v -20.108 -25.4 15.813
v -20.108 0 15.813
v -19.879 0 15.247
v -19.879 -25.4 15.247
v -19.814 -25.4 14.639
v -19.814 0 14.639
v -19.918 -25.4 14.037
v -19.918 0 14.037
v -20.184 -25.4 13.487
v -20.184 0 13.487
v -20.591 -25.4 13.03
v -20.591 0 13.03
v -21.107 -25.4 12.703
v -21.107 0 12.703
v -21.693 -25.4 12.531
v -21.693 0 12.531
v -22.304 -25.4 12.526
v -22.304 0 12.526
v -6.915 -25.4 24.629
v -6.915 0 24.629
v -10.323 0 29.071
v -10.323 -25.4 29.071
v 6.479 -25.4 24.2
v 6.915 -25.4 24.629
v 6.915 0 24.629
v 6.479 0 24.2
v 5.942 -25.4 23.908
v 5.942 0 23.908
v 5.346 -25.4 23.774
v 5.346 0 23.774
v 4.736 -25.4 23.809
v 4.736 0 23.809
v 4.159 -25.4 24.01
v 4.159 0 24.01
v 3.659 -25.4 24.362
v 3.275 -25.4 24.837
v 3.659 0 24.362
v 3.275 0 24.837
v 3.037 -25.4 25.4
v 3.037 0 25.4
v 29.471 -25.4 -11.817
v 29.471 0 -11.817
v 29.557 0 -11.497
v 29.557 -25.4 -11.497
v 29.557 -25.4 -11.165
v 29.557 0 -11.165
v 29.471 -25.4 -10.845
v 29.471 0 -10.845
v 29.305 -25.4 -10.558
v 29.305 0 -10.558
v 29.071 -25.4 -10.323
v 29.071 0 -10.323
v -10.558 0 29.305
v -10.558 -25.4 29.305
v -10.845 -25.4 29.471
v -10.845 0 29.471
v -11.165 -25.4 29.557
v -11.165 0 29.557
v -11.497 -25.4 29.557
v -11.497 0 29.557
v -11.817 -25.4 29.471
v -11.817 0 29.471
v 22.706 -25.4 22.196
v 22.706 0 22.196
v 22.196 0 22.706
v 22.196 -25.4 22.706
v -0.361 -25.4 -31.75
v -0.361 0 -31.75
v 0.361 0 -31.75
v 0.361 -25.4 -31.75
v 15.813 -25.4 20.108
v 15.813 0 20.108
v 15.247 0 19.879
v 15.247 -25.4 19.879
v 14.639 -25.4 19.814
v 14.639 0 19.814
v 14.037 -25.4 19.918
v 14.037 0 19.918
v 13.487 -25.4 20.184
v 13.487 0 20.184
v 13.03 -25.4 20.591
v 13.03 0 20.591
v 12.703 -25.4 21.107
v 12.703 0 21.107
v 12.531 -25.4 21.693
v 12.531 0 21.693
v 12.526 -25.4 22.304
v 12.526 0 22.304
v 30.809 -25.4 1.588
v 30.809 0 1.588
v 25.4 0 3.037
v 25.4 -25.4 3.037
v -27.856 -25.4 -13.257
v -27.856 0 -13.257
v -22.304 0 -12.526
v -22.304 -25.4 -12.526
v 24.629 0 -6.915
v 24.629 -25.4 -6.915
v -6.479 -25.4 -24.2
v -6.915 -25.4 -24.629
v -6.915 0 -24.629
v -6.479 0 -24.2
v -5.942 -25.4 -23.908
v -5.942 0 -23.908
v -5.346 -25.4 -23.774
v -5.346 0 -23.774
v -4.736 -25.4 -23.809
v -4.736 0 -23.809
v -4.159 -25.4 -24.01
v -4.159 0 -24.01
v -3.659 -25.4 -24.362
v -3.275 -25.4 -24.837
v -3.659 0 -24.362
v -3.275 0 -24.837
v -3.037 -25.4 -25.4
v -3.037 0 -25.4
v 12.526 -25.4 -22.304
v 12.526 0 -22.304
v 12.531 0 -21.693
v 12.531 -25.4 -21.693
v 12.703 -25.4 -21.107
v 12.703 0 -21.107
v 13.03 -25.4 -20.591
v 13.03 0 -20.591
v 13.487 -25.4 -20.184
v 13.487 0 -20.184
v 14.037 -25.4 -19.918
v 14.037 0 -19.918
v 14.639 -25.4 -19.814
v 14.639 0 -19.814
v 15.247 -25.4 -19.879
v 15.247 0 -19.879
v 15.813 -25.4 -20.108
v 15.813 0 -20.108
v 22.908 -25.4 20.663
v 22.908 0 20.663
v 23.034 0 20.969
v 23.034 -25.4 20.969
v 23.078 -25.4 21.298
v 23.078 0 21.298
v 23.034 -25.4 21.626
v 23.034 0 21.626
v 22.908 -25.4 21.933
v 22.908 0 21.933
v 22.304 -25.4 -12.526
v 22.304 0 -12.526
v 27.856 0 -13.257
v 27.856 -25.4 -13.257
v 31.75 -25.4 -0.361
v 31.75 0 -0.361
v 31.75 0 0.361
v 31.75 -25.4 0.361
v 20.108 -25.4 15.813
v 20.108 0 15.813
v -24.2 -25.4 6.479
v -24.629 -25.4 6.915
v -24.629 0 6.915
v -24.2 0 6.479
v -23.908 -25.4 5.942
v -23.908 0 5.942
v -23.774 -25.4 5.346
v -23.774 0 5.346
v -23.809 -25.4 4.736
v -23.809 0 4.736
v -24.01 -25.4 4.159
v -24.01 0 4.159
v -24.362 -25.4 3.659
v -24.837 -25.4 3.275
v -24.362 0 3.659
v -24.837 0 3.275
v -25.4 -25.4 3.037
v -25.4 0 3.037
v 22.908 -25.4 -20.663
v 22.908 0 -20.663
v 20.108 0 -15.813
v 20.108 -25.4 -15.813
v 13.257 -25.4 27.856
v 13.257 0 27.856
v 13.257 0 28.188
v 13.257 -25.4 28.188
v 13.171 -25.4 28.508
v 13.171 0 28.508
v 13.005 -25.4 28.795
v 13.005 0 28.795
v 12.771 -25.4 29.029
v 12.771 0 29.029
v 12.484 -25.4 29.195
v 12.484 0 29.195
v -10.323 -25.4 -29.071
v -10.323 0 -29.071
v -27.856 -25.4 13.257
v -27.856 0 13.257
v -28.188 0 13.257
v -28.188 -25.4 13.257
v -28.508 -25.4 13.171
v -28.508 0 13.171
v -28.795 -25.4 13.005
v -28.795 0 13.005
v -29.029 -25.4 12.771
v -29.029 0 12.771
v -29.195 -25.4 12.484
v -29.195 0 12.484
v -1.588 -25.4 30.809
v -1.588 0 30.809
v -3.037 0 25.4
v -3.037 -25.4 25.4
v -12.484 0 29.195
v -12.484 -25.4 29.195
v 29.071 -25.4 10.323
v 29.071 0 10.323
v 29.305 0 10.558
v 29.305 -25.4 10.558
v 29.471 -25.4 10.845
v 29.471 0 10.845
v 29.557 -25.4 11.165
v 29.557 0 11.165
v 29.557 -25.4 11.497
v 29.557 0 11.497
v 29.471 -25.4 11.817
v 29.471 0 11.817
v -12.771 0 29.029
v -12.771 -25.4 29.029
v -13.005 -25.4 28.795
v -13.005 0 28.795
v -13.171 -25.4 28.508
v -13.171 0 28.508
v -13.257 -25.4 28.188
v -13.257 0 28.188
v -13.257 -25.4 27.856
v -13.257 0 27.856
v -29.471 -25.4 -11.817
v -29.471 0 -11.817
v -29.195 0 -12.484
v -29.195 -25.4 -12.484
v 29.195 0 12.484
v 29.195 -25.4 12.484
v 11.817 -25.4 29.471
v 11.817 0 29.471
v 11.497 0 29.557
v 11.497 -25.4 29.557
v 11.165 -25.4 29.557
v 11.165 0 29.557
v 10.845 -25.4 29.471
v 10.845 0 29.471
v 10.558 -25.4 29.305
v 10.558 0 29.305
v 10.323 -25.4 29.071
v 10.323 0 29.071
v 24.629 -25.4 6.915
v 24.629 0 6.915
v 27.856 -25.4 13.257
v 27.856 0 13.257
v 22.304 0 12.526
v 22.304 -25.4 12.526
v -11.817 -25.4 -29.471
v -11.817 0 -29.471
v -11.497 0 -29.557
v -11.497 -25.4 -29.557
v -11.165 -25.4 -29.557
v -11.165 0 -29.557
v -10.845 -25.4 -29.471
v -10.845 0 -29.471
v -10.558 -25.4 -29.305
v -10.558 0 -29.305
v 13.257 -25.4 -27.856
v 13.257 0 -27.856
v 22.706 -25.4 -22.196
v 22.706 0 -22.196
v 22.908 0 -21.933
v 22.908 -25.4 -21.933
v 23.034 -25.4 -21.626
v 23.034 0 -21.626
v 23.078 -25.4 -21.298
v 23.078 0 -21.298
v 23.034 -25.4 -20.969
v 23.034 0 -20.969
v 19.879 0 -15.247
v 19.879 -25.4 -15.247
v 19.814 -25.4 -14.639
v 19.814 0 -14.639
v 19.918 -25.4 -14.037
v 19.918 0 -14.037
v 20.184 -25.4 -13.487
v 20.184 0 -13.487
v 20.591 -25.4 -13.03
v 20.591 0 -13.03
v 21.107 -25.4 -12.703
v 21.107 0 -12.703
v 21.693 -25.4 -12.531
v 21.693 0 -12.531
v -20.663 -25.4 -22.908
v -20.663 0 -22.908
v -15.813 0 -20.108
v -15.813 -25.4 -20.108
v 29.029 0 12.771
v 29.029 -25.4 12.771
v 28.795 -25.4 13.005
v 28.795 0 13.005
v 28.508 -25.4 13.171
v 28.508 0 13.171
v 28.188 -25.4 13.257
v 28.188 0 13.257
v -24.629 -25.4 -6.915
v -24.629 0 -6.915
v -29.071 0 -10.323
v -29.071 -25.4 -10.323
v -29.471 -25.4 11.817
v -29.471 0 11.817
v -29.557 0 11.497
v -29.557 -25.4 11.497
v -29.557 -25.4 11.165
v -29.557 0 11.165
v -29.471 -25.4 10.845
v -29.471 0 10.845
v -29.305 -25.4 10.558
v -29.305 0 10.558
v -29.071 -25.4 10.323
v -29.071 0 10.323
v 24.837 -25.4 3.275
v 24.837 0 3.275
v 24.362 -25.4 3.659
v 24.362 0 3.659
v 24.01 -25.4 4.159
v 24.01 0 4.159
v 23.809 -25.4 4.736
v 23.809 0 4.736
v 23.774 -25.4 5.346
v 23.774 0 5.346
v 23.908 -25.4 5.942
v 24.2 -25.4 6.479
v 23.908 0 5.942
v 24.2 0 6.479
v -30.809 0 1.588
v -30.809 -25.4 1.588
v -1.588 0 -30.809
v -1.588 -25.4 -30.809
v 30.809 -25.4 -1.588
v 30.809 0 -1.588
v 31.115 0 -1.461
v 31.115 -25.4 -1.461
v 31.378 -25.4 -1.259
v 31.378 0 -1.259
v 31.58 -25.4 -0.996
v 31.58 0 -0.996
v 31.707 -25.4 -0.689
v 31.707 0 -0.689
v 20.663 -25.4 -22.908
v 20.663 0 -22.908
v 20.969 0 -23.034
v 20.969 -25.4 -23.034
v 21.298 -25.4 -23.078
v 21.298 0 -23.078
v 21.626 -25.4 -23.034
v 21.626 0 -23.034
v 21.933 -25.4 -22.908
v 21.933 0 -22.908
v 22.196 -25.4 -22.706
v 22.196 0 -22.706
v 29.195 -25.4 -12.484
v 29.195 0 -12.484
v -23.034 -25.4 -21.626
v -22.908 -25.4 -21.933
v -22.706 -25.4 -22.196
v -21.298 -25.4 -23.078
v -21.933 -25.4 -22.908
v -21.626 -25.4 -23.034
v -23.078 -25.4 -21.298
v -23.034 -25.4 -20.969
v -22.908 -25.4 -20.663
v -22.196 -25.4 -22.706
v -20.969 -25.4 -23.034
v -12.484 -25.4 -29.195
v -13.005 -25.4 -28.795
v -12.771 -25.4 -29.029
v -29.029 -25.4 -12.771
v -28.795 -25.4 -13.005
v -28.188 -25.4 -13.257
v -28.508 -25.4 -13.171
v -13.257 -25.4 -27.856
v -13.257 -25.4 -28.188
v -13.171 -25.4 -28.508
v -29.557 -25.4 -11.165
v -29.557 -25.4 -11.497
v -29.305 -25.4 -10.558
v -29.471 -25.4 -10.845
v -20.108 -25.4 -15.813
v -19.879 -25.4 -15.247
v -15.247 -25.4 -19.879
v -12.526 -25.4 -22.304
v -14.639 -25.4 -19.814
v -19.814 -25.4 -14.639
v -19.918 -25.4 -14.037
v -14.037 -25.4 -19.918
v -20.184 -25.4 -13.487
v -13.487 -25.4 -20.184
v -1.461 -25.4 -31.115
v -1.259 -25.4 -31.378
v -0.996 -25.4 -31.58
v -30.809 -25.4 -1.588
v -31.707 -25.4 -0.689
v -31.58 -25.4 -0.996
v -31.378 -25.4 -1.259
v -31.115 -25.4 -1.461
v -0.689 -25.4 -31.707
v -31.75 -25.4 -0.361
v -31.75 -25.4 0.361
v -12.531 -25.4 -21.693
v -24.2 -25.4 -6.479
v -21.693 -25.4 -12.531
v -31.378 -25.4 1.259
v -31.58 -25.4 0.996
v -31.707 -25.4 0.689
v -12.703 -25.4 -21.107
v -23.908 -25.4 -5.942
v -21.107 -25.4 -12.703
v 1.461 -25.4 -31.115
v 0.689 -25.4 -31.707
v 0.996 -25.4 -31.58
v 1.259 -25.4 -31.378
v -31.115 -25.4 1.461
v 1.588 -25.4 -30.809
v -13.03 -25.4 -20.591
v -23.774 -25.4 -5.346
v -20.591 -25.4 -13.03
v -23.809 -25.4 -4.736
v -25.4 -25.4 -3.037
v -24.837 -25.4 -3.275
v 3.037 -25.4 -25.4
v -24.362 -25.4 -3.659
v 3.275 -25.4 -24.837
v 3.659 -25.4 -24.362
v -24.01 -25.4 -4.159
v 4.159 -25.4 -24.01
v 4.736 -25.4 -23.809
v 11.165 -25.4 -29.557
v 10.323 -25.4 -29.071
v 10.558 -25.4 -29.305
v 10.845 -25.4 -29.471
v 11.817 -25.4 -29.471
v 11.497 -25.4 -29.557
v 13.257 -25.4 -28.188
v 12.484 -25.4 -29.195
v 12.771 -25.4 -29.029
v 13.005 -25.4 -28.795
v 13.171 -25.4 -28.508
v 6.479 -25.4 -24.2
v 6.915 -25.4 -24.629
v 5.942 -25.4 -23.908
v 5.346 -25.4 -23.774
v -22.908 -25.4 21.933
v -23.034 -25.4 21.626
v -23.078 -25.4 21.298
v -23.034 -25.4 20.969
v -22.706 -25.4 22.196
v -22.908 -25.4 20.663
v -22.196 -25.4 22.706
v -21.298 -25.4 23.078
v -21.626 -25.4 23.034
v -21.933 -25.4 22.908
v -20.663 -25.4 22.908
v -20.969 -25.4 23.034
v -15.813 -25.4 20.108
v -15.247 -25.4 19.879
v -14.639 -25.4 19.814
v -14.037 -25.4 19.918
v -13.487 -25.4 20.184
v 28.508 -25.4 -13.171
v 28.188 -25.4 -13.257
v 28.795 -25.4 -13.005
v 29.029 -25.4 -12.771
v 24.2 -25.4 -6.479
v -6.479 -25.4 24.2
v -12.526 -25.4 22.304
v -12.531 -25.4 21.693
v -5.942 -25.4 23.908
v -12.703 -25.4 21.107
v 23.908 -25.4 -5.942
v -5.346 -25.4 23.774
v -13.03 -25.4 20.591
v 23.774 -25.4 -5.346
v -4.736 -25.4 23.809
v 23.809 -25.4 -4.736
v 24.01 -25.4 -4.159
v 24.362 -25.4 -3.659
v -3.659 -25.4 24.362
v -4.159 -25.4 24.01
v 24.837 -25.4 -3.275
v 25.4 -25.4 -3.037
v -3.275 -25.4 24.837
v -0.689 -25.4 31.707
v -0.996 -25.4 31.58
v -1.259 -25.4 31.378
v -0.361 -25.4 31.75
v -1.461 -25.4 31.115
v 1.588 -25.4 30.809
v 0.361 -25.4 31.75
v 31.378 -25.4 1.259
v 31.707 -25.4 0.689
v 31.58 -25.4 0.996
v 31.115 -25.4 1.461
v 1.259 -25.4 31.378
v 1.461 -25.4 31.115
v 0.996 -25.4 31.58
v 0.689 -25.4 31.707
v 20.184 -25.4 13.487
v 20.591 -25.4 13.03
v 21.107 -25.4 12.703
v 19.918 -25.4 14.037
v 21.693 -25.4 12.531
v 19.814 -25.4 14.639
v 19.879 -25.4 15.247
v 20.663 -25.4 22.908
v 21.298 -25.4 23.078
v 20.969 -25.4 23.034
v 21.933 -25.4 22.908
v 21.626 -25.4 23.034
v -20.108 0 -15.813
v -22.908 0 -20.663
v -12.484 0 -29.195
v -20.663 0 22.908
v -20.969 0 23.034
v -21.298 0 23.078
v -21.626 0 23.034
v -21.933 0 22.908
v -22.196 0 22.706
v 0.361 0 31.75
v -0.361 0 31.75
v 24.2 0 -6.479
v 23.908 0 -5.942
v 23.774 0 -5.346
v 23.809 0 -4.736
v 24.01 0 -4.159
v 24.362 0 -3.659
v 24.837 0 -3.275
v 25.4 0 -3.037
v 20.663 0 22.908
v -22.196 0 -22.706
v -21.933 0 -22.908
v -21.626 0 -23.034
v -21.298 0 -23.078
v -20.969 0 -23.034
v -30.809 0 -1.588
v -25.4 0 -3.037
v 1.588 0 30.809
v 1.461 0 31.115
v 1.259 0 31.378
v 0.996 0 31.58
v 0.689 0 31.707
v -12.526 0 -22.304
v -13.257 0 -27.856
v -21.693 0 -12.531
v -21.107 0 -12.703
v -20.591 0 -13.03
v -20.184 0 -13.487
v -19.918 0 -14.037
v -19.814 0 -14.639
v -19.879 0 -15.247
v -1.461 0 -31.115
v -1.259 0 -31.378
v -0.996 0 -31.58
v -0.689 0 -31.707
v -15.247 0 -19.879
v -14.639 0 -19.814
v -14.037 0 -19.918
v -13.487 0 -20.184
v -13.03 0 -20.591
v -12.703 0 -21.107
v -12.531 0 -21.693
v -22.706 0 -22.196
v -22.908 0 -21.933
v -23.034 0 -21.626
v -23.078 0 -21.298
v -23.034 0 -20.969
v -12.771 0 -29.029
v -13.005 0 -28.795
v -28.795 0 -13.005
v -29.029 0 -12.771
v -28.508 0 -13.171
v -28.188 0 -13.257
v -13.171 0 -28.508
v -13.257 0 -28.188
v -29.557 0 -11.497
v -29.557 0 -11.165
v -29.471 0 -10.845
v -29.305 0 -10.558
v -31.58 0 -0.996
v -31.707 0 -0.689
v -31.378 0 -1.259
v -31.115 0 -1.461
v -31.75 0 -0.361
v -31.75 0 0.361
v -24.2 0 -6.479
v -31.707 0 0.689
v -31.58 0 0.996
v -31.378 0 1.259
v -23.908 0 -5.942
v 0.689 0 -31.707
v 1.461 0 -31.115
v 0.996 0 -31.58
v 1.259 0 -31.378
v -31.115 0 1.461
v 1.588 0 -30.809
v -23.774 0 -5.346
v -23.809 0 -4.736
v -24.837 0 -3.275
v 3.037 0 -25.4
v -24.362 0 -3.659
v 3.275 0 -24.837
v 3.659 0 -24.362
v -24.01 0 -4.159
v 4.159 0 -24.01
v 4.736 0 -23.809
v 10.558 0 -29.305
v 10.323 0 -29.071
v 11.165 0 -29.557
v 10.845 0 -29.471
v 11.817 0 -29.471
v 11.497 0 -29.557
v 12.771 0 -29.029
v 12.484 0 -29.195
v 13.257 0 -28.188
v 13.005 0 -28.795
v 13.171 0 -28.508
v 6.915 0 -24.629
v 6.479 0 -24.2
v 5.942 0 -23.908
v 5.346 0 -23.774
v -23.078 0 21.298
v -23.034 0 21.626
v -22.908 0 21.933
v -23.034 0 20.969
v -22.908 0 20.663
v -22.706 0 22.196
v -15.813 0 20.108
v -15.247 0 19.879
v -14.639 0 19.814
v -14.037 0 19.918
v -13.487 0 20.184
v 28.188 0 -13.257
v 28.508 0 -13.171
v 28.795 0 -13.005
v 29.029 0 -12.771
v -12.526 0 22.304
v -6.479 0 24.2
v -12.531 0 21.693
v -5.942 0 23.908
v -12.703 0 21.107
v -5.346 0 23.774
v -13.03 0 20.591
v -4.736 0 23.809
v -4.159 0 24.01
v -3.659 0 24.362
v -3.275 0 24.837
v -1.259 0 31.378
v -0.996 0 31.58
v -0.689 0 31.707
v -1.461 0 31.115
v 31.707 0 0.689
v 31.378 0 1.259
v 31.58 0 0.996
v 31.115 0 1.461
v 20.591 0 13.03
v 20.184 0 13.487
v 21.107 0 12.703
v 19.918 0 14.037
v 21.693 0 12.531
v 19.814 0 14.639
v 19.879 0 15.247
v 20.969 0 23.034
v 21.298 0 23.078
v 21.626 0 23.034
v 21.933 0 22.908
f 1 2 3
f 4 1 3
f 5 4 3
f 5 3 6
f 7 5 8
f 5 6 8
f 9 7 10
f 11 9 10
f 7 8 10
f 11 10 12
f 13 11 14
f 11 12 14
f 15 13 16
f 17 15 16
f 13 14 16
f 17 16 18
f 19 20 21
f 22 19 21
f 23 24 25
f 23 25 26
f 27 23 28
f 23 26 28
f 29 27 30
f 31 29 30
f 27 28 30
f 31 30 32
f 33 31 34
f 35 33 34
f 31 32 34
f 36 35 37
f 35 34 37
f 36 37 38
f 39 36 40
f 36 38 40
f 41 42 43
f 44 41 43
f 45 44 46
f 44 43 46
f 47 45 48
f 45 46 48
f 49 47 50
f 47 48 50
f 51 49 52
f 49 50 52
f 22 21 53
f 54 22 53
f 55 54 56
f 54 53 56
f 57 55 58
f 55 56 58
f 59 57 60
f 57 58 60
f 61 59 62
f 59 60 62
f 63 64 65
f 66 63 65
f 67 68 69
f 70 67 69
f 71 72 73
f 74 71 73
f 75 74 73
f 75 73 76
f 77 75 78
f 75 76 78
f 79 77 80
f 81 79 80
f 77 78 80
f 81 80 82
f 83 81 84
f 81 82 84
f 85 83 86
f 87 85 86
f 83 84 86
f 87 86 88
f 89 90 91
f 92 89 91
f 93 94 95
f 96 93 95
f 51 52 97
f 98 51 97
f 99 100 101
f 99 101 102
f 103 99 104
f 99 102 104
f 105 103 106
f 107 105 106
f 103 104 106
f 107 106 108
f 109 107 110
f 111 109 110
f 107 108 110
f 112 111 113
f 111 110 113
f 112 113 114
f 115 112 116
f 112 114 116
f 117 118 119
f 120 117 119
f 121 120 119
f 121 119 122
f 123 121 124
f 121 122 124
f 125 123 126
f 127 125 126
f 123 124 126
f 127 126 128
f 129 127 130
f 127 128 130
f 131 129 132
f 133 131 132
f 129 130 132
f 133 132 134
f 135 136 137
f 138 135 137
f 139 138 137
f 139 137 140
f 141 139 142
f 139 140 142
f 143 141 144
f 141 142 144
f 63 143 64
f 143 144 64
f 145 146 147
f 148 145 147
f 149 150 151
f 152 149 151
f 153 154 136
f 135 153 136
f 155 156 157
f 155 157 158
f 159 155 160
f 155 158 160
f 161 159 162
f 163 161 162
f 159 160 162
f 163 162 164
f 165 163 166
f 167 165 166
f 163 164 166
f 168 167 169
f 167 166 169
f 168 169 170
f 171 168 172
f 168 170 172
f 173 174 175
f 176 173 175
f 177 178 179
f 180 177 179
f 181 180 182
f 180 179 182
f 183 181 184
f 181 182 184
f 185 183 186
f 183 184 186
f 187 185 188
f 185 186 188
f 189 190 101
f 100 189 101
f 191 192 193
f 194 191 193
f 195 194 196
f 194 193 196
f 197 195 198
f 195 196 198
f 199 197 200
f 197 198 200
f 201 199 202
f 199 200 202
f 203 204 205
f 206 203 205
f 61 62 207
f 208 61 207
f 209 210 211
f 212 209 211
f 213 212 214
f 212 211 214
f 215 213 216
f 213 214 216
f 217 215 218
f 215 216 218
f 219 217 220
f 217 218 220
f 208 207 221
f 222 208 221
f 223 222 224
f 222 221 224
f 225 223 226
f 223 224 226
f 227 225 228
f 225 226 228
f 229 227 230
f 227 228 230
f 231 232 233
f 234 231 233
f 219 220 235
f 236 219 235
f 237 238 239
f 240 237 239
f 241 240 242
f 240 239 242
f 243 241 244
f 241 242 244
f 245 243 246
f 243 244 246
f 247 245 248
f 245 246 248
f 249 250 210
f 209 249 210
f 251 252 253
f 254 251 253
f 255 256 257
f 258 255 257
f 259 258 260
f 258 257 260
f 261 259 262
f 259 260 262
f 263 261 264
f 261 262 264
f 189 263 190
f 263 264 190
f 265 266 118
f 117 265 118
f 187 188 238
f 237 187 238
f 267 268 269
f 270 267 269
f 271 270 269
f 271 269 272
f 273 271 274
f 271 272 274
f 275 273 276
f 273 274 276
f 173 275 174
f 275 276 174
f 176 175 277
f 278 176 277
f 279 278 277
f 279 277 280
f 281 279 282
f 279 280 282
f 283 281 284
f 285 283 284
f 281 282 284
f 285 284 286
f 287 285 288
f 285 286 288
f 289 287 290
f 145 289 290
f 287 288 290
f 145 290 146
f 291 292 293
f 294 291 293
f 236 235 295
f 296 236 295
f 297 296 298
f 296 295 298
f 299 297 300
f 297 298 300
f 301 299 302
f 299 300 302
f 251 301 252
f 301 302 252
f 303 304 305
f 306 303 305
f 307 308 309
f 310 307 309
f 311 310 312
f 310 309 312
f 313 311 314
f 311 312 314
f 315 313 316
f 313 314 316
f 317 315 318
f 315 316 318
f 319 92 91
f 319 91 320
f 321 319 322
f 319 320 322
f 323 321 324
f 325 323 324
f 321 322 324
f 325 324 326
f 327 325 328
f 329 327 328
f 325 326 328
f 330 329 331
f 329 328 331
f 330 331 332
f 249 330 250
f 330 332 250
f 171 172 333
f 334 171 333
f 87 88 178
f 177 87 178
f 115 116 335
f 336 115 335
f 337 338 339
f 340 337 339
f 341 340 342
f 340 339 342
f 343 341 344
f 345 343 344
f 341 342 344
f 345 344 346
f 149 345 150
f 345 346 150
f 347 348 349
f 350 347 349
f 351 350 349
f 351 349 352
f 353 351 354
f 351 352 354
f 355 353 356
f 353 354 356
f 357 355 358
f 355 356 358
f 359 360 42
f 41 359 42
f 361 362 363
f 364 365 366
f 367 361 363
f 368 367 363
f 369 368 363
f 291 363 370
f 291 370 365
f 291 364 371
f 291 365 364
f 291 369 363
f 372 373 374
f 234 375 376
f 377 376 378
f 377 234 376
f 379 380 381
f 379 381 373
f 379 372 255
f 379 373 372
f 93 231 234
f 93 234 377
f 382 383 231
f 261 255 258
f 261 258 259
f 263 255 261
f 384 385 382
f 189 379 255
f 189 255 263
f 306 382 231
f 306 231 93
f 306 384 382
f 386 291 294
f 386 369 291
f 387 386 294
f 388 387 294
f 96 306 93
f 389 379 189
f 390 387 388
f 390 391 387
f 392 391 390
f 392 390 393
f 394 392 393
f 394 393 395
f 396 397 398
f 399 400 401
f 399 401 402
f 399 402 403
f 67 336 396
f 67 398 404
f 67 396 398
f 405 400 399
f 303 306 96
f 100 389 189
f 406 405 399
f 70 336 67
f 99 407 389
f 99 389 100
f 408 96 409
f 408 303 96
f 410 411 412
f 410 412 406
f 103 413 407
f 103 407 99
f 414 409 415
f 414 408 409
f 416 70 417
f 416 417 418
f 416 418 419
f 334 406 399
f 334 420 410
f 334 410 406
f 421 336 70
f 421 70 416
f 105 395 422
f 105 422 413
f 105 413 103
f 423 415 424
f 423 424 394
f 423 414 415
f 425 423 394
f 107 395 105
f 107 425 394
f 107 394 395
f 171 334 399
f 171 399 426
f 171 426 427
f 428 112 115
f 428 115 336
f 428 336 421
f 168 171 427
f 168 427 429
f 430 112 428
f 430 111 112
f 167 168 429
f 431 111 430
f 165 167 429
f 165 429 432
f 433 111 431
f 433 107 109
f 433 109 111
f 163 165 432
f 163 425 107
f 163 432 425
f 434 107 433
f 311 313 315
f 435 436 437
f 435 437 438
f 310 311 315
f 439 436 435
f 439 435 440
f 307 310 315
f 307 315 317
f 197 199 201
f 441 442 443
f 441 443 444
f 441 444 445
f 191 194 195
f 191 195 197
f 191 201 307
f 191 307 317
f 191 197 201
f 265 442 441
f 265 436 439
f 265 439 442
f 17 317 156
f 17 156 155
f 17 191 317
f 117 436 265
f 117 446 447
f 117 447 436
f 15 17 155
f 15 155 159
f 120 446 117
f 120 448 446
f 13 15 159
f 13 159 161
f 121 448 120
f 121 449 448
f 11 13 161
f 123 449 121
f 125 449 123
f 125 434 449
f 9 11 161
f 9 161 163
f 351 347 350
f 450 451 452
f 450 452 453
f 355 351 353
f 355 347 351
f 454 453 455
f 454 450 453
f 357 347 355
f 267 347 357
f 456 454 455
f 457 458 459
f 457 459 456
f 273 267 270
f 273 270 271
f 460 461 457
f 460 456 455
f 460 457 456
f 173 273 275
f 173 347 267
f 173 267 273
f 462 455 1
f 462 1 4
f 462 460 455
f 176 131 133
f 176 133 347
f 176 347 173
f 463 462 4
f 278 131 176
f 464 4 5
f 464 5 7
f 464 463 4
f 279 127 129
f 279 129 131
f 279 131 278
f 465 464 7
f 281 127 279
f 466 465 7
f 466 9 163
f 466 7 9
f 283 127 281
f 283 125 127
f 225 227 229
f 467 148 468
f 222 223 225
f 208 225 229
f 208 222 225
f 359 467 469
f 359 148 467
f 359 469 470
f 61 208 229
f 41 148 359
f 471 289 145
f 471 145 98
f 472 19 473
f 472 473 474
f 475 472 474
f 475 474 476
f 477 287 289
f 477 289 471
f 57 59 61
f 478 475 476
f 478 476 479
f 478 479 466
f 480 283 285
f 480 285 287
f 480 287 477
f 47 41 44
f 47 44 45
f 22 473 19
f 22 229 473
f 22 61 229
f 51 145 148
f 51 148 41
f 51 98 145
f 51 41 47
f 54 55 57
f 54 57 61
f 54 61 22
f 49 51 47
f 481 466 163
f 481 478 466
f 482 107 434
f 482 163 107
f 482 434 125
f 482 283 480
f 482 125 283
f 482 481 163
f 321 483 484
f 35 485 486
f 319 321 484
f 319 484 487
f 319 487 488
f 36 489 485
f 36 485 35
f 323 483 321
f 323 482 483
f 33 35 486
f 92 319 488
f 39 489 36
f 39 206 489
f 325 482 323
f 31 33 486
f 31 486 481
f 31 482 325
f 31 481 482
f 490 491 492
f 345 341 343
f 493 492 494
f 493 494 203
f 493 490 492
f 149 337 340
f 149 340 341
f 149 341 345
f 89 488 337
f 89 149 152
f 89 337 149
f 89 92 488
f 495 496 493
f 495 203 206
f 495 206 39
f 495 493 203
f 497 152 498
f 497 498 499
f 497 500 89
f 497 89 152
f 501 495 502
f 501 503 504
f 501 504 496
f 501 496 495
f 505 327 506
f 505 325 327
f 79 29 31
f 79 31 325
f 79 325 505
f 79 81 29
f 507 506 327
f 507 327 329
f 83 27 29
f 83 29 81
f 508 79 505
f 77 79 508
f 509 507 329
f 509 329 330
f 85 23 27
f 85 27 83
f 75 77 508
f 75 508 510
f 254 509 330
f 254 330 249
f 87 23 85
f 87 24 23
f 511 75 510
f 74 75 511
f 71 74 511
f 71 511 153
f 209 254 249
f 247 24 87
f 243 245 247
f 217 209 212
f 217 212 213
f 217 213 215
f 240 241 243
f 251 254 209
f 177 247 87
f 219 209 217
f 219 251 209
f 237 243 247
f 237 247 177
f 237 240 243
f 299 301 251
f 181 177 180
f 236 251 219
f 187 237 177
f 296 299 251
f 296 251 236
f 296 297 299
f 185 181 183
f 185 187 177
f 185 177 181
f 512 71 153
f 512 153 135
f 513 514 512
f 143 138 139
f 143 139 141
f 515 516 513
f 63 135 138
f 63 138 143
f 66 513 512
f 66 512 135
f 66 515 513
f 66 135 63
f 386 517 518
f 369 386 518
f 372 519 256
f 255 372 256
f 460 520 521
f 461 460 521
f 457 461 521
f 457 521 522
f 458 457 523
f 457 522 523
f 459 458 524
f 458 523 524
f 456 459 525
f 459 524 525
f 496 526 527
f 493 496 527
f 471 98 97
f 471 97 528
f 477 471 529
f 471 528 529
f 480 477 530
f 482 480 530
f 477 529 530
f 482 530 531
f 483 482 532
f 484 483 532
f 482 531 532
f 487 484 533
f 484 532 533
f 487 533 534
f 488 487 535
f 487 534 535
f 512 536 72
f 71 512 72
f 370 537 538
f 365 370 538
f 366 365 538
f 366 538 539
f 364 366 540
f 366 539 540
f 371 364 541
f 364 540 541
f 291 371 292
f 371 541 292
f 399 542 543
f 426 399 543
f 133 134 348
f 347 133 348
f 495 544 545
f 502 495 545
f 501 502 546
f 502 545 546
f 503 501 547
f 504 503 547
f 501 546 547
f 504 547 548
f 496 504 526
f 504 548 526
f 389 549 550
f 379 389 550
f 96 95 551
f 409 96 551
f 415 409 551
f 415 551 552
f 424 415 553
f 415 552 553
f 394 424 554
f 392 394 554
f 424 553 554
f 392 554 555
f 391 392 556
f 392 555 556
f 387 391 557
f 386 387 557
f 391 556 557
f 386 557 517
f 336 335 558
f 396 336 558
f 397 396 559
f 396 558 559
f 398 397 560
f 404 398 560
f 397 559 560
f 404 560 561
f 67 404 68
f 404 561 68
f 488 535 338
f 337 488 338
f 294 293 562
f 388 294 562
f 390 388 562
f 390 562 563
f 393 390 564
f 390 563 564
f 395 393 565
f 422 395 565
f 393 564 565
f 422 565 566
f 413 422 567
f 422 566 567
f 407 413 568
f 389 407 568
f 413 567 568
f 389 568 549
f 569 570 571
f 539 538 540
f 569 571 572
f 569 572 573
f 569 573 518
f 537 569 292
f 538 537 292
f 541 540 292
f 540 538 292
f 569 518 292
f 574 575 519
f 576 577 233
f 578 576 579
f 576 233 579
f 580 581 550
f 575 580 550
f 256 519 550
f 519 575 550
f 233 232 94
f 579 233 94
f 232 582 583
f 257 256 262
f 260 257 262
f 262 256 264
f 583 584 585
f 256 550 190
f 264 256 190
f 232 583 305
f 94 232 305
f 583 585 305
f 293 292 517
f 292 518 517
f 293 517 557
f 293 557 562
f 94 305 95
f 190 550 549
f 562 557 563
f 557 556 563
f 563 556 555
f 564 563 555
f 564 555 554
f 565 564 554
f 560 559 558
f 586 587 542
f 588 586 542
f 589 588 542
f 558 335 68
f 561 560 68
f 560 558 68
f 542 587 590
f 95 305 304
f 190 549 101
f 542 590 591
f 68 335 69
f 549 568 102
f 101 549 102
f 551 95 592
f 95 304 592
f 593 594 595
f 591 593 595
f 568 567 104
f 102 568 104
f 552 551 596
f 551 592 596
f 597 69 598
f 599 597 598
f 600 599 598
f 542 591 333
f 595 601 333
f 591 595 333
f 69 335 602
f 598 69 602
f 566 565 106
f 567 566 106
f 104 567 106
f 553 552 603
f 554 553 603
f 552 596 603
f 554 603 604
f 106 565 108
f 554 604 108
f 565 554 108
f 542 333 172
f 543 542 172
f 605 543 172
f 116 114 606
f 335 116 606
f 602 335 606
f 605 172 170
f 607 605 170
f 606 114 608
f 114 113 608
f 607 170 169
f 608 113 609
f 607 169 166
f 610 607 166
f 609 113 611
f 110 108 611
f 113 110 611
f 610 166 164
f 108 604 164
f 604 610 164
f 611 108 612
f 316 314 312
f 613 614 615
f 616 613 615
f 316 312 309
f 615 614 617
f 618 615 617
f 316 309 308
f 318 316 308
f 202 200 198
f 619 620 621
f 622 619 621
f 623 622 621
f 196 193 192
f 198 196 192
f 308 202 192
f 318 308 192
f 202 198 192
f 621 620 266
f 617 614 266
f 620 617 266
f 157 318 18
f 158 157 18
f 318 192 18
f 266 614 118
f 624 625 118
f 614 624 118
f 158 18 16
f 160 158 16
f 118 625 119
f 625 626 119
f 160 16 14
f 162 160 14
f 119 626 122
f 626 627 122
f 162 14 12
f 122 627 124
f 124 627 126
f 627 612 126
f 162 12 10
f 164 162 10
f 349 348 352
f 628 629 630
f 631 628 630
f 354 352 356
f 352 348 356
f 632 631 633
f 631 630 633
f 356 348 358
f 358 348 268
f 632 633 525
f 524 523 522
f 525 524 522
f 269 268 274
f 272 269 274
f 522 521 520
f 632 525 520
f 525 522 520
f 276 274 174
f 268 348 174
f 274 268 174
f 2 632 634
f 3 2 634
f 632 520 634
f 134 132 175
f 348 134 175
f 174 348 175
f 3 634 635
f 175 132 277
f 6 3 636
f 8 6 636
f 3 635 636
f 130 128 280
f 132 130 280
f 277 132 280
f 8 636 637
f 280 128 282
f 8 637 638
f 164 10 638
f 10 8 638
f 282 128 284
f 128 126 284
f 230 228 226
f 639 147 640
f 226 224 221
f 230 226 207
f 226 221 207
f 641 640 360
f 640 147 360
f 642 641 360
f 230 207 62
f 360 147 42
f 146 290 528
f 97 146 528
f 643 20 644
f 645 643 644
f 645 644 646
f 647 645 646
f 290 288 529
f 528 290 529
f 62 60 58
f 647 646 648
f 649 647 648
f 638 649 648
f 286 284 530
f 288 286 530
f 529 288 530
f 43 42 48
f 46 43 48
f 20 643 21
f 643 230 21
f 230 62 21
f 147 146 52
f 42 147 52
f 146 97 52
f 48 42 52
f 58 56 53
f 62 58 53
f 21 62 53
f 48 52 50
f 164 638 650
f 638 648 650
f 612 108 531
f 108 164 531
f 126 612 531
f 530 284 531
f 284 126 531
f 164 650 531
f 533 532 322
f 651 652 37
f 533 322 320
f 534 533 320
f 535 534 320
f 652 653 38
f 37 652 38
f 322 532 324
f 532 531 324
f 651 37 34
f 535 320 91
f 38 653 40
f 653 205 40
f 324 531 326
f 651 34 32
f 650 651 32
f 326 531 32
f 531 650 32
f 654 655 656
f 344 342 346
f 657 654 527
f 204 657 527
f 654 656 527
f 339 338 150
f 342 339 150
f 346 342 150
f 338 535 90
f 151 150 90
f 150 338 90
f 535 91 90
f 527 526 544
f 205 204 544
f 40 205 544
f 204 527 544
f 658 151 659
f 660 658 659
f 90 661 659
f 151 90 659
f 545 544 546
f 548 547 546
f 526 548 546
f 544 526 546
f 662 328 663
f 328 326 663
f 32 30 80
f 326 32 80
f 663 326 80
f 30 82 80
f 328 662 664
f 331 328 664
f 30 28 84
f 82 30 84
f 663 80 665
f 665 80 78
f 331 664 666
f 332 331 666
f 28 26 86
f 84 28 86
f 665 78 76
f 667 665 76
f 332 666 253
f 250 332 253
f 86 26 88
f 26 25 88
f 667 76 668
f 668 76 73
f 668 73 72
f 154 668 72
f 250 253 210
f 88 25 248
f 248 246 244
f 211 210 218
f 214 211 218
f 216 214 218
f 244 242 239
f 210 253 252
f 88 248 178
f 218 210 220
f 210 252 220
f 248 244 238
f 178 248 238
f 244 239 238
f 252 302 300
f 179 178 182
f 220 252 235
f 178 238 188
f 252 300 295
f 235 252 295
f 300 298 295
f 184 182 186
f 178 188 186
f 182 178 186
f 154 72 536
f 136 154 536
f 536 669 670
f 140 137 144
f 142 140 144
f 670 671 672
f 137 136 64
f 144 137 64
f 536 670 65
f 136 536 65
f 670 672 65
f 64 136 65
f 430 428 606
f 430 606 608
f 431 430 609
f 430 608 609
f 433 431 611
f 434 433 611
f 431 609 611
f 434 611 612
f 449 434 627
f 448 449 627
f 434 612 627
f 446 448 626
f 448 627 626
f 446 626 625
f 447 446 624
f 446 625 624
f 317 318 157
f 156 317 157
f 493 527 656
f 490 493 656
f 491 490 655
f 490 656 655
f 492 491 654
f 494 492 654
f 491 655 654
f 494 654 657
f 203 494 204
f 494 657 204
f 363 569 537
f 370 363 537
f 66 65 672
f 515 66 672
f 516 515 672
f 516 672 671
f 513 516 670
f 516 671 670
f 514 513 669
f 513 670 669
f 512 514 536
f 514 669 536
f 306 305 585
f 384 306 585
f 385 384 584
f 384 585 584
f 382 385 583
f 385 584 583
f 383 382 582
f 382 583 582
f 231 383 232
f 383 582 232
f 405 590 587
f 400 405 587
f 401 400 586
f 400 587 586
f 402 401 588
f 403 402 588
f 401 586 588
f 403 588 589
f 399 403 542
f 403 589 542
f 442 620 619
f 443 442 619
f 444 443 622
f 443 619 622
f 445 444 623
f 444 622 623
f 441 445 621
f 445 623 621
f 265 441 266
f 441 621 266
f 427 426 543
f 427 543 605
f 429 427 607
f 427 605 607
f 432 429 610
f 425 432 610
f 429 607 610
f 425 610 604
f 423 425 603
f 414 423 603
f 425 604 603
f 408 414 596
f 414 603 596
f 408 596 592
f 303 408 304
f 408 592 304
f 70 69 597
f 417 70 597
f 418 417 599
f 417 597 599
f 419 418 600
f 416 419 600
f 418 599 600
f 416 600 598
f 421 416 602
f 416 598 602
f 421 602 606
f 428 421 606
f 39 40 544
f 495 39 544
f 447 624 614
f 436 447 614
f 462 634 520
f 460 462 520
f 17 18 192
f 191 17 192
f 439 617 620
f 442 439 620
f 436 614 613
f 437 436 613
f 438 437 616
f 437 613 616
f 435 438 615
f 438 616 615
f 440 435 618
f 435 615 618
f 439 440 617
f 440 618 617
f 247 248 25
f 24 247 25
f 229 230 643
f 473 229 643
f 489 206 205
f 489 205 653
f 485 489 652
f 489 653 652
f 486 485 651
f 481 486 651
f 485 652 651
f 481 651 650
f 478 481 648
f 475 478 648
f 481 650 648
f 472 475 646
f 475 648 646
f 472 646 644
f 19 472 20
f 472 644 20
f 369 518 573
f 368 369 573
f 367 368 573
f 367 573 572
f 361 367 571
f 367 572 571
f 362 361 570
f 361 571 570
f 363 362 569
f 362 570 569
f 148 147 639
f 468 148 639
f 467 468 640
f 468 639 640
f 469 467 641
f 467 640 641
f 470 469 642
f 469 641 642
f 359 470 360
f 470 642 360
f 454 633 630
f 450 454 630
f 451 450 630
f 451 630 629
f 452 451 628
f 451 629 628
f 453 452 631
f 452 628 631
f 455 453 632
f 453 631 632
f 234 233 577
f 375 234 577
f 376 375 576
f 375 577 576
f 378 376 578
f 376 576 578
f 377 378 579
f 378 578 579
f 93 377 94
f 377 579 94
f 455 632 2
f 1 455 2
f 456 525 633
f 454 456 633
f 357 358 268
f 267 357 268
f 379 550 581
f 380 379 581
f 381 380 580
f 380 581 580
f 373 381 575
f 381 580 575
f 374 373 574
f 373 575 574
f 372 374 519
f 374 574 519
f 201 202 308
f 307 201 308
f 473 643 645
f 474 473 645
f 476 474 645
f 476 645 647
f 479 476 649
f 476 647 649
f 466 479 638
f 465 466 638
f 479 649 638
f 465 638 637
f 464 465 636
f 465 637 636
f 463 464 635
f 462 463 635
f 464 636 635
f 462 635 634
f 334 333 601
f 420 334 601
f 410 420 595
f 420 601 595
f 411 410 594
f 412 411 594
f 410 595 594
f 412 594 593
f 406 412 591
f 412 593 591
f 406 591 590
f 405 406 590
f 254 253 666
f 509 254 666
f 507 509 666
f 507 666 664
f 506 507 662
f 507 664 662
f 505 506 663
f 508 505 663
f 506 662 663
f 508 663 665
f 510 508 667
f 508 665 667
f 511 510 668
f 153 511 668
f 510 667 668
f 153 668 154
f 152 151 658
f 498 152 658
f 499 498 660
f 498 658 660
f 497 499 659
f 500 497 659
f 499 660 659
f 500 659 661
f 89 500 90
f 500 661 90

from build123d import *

# Parameters (mm, degrees)
F1_DEPTH = 25.4


with BuildPart() as f1:
    # F0 (on Front) → F1 (new body)
    with BuildSketch(Plane.XZ):
        with BuildLine():
            Line((0.360774, 31.75), (0, 31.75))
            Line((0, 31.75), (-0.360774, 31.75))
            ThreePointArc((-0.360774, 31.75), (-1.133901, 31.487559), (-1.5875, 30.8087))
            Line((-1.5875, 30.8087), (-3.036757, 25.4))
            ThreePointArc((-3.036757, 25.4), (-4.735833, 23.808641), (-6.914562, 24.628657))
            Line((-6.914562, 24.628657), (-10.32332, 29.071037))
            ThreePointArc((-10.32332, 29.071037), (-11.002179, 29.524636), (-11.816887, 29.471237))
            Line((-11.816887, 29.471237), (-12.150199, 29.333175))
            Line((-12.150199, 29.333175), (-12.483511, 29.195113))
            ThreePointArc((-12.483511, 29.195113), (-13.097355, 28.656786), (-13.256638, 27.856018))
            Line((-13.256638, 27.856018), (-12.525757, 22.304424))
            ThreePointArc((-12.525757, 22.304424), (-13.486512, 20.183992), (-15.813201, 20.107824))
            Line((-15.813201, 20.107824), (-20.662509, 22.907573))
            ThreePointArc((-20.662509, 22.907573), (-21.463277, 23.066856), (-22.195534, 22.705746))
            Line((-22.195534, 22.705746), (-22.45064, 22.45064))
            Line((-22.45064, 22.45064), (-22.705746, 22.195534))
            ThreePointArc((-22.705746, 22.195534), (-23.066856, 21.463277), (-22.907573, 20.662509))
            Line((-22.907573, 20.662509), (-20.107824, 15.813201))
            ThreePointArc((-20.107824, 15.813201), (-20.183992, 13.486512), (-22.304424, 12.525757))
            Line((-22.304424, 12.525757), (-27.856018, 13.256638))
            ThreePointArc((-27.856018, 13.256638), (-28.656786, 13.097355), (-29.195113, 12.483511))
            Line((-29.195113, 12.483511), (-29.333175, 12.150199))
            Line((-29.333175, 12.150199), (-29.471237, 11.816887))
            ThreePointArc((-29.471237, 11.816887), (-29.524636, 11.002179), (-29.071037, 10.32332))
            Line((-29.071037, 10.32332), (-24.628657, 6.914562))
            ThreePointArc((-24.628657, 6.914562), (-23.808641, 4.735833), (-25.4, 3.036757))
            Line((-25.4, 3.036757), (-30.8087, 1.5875))
            ThreePointArc((-30.8087, 1.5875), (-31.487559, 1.133901), (-31.75, 0.360774))
            Line((-31.75, 0.360774), (-31.75, 0))
            Line((-31.75, 0), (-31.75, -0.360774))
            ThreePointArc((-31.75, -0.360774), (-31.487559, -1.133901), (-30.8087, -1.5875))
            Line((-30.8087, -1.5875), (-25.4, -3.036757))
            ThreePointArc((-25.4, -3.036757), (-23.808641, -4.735833), (-24.628657, -6.914562))
            Line((-24.628657, -6.914562), (-29.071037, -10.32332))
            ThreePointArc((-29.071037, -10.32332), (-29.524636, -11.002179), (-29.471237, -11.816887))
            Line((-29.471237, -11.816887), (-29.333175, -12.150199))
            Line((-29.333175, -12.150199), (-29.195113, -12.483511))
            ThreePointArc((-29.195113, -12.483511), (-28.656786, -13.097355), (-27.856018, -13.256638))
            Line((-27.856018, -13.256638), (-22.304424, -12.525757))
            ThreePointArc((-22.304424, -12.525757), (-20.183992, -13.486512), (-20.107824, -15.813201))
            Line((-20.107824, -15.813201), (-22.907573, -20.662509))
            ThreePointArc((-22.907573, -20.662509), (-23.066856, -21.463277), (-22.705746, -22.195534))
            Line((-22.705746, -22.195534), (-22.45064, -22.45064))
            Line((-22.45064, -22.45064), (-22.195534, -22.705746))
            ThreePointArc((-22.195534, -22.705746), (-21.463277, -23.066856), (-20.662509, -22.907573))
            Line((-20.662509, -22.907573), (-15.813201, -20.107824))
            ThreePointArc((-15.813201, -20.107824), (-13.486512, -20.183992), (-12.525757, -22.304424))
            Line((-12.525757, -22.304424), (-13.256638, -27.856018))
            ThreePointArc((-13.256638, -27.856018), (-13.097355, -28.656786), (-12.483511, -29.195113))
            Line((-12.483511, -29.195113), (-12.150199, -29.333175))
            Line((-12.150199, -29.333175), (-11.816887, -29.471237))
            ThreePointArc((-11.816887, -29.471237), (-11.002179, -29.524636), (-10.32332, -29.071037))
            Line((-10.32332, -29.071037), (-6.914562, -24.628657))
            ThreePointArc((-6.914562, -24.628657), (-4.735833, -23.808641), (-3.036757, -25.4))
            Line((-3.036757, -25.4), (-1.5875, -30.8087))
            ThreePointArc((-1.5875, -30.8087), (-1.133901, -31.487559), (-0.360774, -31.75))
            Line((-0.360774, -31.75), (0, -31.75))
            Line((0, -31.75), (0.360774, -31.75))
            ThreePointArc((0.360774, -31.75), (1.133901, -31.487559), (1.5875, -30.8087))
            Line((1.5875, -30.8087), (3.036757, -25.4))
            ThreePointArc((3.036757, -25.4), (4.735833, -23.808641), (6.914562, -24.628657))
            Line((6.914562, -24.628657), (10.32332, -29.071037))
            ThreePointArc((10.32332, -29.071037), (11.002179, -29.524636), (11.816887, -29.471237))
            Line((11.816887, -29.471237), (12.150199, -29.333175))
            Line((12.150199, -29.333175), (12.483511, -29.195113))
            ThreePointArc((12.483511, -29.195113), (13.097355, -28.656786), (13.256638, -27.856018))
            Line((13.256638, -27.856018), (12.525757, -22.304424))
            ThreePointArc((12.525757, -22.304424), (13.486512, -20.183992), (15.813201, -20.107824))
            Line((15.813201, -20.107824), (20.662509, -22.907573))
            ThreePointArc((20.662509, -22.907573), (21.463277, -23.066856), (22.195534, -22.705746))
            Line((22.195534, -22.705746), (22.45064, -22.45064))
            Line((22.45064, -22.45064), (22.705746, -22.195534))
            ThreePointArc((22.705746, -22.195534), (23.066856, -21.463277), (22.907573, -20.662509))
            Line((22.907573, -20.662509), (20.107824, -15.813201))
            ThreePointArc((20.107824, -15.813201), (20.183992, -13.486512), (22.304424, -12.525757))
            Line((22.304424, -12.525757), (27.856018, -13.256638))
            ThreePointArc((27.856018, -13.256638), (28.656786, -13.097355), (29.195113, -12.483511))
            Line((29.195113, -12.483511), (29.333175, -12.150199))
            Line((29.333175, -12.150199), (29.471237, -11.816887))
            ThreePointArc((29.471237, -11.816887), (29.524636, -11.002179), (29.071037, -10.32332))
            Line((29.071037, -10.32332), (24.628657, -6.914562))
            ThreePointArc((24.628657, -6.914562), (23.808641, -4.735833), (25.4, -3.036757))
            Line((25.4, -3.036757), (30.8087, -1.5875))
            ThreePointArc((30.8087, -1.5875), (31.487559, -1.133901), (31.75, -0.360774))
            Line((31.75, -0.360774), (31.75, 0))
            Line((31.75, 0), (31.75, 0.360774))
            ThreePointArc((31.75, 0.360774), (31.487559, 1.133901), (30.8087, 1.5875))
            Line((30.8087, 1.5875), (25.4, 3.036757))
            ThreePointArc((25.4, 3.036757), (23.808641, 4.735833), (24.628657, 6.914562))
            Line((24.628657, 6.914562), (29.071037, 10.32332))
            ThreePointArc((29.071037, 10.32332), (29.524636, 11.002179), (29.471237, 11.816887))
            Line((29.471237, 11.816887), (29.333175, 12.150199))
            Line((29.333175, 12.150199), (29.195113, 12.483511))
            ThreePointArc((29.195113, 12.483511), (28.656786, 13.097355), (27.856018, 13.256638))
            Line((27.856018, 13.256638), (22.304424, 12.525757))
            ThreePointArc((22.304424, 12.525757), (20.183992, 13.486512), (20.107824, 15.813201))
            Line((20.107824, 15.813201), (22.907573, 20.662509))
            ThreePointArc((22.907573, 20.662509), (23.066856, 21.463277), (22.705746, 22.195534))
            Line((22.705746, 22.195534), (22.45064, 22.45064))
            Line((22.45064, 22.45064), (22.195534, 22.705746))
            ThreePointArc((22.195534, 22.705746), (21.463277, 23.066856), (20.662509, 22.907573))
            Line((20.662509, 22.907573), (15.813201, 20.107824))
            ThreePointArc((15.813201, 20.107824), (13.486512, 20.183992), (12.525757, 22.304424))
            Line((12.525757, 22.304424), (13.256638, 27.856018))
            ThreePointArc((13.256638, 27.856018), (13.097355, 28.656786), (12.483511, 29.195113))
            Line((12.483511, 29.195113), (12.150199, 29.333175))
            Line((12.150199, 29.333175), (11.816887, 29.471237))
            ThreePointArc((11.816887, 29.471237), (11.002179, 29.524636), (10.32332, 29.071037))
            Line((10.32332, 29.071037), (6.914562, 24.628657))
            ThreePointArc((6.914562, 24.628657), (4.735833, 23.808641), (3.036757, 25.4))
            Line((3.036757, 25.4), (1.5875, 30.8087))
            ThreePointArc((1.5875, 30.8087), (1.133901, 31.487559), (0.360774, 31.75))
        make_face()
    extrude(amount=F1_DEPTH)


solid = f1.part
